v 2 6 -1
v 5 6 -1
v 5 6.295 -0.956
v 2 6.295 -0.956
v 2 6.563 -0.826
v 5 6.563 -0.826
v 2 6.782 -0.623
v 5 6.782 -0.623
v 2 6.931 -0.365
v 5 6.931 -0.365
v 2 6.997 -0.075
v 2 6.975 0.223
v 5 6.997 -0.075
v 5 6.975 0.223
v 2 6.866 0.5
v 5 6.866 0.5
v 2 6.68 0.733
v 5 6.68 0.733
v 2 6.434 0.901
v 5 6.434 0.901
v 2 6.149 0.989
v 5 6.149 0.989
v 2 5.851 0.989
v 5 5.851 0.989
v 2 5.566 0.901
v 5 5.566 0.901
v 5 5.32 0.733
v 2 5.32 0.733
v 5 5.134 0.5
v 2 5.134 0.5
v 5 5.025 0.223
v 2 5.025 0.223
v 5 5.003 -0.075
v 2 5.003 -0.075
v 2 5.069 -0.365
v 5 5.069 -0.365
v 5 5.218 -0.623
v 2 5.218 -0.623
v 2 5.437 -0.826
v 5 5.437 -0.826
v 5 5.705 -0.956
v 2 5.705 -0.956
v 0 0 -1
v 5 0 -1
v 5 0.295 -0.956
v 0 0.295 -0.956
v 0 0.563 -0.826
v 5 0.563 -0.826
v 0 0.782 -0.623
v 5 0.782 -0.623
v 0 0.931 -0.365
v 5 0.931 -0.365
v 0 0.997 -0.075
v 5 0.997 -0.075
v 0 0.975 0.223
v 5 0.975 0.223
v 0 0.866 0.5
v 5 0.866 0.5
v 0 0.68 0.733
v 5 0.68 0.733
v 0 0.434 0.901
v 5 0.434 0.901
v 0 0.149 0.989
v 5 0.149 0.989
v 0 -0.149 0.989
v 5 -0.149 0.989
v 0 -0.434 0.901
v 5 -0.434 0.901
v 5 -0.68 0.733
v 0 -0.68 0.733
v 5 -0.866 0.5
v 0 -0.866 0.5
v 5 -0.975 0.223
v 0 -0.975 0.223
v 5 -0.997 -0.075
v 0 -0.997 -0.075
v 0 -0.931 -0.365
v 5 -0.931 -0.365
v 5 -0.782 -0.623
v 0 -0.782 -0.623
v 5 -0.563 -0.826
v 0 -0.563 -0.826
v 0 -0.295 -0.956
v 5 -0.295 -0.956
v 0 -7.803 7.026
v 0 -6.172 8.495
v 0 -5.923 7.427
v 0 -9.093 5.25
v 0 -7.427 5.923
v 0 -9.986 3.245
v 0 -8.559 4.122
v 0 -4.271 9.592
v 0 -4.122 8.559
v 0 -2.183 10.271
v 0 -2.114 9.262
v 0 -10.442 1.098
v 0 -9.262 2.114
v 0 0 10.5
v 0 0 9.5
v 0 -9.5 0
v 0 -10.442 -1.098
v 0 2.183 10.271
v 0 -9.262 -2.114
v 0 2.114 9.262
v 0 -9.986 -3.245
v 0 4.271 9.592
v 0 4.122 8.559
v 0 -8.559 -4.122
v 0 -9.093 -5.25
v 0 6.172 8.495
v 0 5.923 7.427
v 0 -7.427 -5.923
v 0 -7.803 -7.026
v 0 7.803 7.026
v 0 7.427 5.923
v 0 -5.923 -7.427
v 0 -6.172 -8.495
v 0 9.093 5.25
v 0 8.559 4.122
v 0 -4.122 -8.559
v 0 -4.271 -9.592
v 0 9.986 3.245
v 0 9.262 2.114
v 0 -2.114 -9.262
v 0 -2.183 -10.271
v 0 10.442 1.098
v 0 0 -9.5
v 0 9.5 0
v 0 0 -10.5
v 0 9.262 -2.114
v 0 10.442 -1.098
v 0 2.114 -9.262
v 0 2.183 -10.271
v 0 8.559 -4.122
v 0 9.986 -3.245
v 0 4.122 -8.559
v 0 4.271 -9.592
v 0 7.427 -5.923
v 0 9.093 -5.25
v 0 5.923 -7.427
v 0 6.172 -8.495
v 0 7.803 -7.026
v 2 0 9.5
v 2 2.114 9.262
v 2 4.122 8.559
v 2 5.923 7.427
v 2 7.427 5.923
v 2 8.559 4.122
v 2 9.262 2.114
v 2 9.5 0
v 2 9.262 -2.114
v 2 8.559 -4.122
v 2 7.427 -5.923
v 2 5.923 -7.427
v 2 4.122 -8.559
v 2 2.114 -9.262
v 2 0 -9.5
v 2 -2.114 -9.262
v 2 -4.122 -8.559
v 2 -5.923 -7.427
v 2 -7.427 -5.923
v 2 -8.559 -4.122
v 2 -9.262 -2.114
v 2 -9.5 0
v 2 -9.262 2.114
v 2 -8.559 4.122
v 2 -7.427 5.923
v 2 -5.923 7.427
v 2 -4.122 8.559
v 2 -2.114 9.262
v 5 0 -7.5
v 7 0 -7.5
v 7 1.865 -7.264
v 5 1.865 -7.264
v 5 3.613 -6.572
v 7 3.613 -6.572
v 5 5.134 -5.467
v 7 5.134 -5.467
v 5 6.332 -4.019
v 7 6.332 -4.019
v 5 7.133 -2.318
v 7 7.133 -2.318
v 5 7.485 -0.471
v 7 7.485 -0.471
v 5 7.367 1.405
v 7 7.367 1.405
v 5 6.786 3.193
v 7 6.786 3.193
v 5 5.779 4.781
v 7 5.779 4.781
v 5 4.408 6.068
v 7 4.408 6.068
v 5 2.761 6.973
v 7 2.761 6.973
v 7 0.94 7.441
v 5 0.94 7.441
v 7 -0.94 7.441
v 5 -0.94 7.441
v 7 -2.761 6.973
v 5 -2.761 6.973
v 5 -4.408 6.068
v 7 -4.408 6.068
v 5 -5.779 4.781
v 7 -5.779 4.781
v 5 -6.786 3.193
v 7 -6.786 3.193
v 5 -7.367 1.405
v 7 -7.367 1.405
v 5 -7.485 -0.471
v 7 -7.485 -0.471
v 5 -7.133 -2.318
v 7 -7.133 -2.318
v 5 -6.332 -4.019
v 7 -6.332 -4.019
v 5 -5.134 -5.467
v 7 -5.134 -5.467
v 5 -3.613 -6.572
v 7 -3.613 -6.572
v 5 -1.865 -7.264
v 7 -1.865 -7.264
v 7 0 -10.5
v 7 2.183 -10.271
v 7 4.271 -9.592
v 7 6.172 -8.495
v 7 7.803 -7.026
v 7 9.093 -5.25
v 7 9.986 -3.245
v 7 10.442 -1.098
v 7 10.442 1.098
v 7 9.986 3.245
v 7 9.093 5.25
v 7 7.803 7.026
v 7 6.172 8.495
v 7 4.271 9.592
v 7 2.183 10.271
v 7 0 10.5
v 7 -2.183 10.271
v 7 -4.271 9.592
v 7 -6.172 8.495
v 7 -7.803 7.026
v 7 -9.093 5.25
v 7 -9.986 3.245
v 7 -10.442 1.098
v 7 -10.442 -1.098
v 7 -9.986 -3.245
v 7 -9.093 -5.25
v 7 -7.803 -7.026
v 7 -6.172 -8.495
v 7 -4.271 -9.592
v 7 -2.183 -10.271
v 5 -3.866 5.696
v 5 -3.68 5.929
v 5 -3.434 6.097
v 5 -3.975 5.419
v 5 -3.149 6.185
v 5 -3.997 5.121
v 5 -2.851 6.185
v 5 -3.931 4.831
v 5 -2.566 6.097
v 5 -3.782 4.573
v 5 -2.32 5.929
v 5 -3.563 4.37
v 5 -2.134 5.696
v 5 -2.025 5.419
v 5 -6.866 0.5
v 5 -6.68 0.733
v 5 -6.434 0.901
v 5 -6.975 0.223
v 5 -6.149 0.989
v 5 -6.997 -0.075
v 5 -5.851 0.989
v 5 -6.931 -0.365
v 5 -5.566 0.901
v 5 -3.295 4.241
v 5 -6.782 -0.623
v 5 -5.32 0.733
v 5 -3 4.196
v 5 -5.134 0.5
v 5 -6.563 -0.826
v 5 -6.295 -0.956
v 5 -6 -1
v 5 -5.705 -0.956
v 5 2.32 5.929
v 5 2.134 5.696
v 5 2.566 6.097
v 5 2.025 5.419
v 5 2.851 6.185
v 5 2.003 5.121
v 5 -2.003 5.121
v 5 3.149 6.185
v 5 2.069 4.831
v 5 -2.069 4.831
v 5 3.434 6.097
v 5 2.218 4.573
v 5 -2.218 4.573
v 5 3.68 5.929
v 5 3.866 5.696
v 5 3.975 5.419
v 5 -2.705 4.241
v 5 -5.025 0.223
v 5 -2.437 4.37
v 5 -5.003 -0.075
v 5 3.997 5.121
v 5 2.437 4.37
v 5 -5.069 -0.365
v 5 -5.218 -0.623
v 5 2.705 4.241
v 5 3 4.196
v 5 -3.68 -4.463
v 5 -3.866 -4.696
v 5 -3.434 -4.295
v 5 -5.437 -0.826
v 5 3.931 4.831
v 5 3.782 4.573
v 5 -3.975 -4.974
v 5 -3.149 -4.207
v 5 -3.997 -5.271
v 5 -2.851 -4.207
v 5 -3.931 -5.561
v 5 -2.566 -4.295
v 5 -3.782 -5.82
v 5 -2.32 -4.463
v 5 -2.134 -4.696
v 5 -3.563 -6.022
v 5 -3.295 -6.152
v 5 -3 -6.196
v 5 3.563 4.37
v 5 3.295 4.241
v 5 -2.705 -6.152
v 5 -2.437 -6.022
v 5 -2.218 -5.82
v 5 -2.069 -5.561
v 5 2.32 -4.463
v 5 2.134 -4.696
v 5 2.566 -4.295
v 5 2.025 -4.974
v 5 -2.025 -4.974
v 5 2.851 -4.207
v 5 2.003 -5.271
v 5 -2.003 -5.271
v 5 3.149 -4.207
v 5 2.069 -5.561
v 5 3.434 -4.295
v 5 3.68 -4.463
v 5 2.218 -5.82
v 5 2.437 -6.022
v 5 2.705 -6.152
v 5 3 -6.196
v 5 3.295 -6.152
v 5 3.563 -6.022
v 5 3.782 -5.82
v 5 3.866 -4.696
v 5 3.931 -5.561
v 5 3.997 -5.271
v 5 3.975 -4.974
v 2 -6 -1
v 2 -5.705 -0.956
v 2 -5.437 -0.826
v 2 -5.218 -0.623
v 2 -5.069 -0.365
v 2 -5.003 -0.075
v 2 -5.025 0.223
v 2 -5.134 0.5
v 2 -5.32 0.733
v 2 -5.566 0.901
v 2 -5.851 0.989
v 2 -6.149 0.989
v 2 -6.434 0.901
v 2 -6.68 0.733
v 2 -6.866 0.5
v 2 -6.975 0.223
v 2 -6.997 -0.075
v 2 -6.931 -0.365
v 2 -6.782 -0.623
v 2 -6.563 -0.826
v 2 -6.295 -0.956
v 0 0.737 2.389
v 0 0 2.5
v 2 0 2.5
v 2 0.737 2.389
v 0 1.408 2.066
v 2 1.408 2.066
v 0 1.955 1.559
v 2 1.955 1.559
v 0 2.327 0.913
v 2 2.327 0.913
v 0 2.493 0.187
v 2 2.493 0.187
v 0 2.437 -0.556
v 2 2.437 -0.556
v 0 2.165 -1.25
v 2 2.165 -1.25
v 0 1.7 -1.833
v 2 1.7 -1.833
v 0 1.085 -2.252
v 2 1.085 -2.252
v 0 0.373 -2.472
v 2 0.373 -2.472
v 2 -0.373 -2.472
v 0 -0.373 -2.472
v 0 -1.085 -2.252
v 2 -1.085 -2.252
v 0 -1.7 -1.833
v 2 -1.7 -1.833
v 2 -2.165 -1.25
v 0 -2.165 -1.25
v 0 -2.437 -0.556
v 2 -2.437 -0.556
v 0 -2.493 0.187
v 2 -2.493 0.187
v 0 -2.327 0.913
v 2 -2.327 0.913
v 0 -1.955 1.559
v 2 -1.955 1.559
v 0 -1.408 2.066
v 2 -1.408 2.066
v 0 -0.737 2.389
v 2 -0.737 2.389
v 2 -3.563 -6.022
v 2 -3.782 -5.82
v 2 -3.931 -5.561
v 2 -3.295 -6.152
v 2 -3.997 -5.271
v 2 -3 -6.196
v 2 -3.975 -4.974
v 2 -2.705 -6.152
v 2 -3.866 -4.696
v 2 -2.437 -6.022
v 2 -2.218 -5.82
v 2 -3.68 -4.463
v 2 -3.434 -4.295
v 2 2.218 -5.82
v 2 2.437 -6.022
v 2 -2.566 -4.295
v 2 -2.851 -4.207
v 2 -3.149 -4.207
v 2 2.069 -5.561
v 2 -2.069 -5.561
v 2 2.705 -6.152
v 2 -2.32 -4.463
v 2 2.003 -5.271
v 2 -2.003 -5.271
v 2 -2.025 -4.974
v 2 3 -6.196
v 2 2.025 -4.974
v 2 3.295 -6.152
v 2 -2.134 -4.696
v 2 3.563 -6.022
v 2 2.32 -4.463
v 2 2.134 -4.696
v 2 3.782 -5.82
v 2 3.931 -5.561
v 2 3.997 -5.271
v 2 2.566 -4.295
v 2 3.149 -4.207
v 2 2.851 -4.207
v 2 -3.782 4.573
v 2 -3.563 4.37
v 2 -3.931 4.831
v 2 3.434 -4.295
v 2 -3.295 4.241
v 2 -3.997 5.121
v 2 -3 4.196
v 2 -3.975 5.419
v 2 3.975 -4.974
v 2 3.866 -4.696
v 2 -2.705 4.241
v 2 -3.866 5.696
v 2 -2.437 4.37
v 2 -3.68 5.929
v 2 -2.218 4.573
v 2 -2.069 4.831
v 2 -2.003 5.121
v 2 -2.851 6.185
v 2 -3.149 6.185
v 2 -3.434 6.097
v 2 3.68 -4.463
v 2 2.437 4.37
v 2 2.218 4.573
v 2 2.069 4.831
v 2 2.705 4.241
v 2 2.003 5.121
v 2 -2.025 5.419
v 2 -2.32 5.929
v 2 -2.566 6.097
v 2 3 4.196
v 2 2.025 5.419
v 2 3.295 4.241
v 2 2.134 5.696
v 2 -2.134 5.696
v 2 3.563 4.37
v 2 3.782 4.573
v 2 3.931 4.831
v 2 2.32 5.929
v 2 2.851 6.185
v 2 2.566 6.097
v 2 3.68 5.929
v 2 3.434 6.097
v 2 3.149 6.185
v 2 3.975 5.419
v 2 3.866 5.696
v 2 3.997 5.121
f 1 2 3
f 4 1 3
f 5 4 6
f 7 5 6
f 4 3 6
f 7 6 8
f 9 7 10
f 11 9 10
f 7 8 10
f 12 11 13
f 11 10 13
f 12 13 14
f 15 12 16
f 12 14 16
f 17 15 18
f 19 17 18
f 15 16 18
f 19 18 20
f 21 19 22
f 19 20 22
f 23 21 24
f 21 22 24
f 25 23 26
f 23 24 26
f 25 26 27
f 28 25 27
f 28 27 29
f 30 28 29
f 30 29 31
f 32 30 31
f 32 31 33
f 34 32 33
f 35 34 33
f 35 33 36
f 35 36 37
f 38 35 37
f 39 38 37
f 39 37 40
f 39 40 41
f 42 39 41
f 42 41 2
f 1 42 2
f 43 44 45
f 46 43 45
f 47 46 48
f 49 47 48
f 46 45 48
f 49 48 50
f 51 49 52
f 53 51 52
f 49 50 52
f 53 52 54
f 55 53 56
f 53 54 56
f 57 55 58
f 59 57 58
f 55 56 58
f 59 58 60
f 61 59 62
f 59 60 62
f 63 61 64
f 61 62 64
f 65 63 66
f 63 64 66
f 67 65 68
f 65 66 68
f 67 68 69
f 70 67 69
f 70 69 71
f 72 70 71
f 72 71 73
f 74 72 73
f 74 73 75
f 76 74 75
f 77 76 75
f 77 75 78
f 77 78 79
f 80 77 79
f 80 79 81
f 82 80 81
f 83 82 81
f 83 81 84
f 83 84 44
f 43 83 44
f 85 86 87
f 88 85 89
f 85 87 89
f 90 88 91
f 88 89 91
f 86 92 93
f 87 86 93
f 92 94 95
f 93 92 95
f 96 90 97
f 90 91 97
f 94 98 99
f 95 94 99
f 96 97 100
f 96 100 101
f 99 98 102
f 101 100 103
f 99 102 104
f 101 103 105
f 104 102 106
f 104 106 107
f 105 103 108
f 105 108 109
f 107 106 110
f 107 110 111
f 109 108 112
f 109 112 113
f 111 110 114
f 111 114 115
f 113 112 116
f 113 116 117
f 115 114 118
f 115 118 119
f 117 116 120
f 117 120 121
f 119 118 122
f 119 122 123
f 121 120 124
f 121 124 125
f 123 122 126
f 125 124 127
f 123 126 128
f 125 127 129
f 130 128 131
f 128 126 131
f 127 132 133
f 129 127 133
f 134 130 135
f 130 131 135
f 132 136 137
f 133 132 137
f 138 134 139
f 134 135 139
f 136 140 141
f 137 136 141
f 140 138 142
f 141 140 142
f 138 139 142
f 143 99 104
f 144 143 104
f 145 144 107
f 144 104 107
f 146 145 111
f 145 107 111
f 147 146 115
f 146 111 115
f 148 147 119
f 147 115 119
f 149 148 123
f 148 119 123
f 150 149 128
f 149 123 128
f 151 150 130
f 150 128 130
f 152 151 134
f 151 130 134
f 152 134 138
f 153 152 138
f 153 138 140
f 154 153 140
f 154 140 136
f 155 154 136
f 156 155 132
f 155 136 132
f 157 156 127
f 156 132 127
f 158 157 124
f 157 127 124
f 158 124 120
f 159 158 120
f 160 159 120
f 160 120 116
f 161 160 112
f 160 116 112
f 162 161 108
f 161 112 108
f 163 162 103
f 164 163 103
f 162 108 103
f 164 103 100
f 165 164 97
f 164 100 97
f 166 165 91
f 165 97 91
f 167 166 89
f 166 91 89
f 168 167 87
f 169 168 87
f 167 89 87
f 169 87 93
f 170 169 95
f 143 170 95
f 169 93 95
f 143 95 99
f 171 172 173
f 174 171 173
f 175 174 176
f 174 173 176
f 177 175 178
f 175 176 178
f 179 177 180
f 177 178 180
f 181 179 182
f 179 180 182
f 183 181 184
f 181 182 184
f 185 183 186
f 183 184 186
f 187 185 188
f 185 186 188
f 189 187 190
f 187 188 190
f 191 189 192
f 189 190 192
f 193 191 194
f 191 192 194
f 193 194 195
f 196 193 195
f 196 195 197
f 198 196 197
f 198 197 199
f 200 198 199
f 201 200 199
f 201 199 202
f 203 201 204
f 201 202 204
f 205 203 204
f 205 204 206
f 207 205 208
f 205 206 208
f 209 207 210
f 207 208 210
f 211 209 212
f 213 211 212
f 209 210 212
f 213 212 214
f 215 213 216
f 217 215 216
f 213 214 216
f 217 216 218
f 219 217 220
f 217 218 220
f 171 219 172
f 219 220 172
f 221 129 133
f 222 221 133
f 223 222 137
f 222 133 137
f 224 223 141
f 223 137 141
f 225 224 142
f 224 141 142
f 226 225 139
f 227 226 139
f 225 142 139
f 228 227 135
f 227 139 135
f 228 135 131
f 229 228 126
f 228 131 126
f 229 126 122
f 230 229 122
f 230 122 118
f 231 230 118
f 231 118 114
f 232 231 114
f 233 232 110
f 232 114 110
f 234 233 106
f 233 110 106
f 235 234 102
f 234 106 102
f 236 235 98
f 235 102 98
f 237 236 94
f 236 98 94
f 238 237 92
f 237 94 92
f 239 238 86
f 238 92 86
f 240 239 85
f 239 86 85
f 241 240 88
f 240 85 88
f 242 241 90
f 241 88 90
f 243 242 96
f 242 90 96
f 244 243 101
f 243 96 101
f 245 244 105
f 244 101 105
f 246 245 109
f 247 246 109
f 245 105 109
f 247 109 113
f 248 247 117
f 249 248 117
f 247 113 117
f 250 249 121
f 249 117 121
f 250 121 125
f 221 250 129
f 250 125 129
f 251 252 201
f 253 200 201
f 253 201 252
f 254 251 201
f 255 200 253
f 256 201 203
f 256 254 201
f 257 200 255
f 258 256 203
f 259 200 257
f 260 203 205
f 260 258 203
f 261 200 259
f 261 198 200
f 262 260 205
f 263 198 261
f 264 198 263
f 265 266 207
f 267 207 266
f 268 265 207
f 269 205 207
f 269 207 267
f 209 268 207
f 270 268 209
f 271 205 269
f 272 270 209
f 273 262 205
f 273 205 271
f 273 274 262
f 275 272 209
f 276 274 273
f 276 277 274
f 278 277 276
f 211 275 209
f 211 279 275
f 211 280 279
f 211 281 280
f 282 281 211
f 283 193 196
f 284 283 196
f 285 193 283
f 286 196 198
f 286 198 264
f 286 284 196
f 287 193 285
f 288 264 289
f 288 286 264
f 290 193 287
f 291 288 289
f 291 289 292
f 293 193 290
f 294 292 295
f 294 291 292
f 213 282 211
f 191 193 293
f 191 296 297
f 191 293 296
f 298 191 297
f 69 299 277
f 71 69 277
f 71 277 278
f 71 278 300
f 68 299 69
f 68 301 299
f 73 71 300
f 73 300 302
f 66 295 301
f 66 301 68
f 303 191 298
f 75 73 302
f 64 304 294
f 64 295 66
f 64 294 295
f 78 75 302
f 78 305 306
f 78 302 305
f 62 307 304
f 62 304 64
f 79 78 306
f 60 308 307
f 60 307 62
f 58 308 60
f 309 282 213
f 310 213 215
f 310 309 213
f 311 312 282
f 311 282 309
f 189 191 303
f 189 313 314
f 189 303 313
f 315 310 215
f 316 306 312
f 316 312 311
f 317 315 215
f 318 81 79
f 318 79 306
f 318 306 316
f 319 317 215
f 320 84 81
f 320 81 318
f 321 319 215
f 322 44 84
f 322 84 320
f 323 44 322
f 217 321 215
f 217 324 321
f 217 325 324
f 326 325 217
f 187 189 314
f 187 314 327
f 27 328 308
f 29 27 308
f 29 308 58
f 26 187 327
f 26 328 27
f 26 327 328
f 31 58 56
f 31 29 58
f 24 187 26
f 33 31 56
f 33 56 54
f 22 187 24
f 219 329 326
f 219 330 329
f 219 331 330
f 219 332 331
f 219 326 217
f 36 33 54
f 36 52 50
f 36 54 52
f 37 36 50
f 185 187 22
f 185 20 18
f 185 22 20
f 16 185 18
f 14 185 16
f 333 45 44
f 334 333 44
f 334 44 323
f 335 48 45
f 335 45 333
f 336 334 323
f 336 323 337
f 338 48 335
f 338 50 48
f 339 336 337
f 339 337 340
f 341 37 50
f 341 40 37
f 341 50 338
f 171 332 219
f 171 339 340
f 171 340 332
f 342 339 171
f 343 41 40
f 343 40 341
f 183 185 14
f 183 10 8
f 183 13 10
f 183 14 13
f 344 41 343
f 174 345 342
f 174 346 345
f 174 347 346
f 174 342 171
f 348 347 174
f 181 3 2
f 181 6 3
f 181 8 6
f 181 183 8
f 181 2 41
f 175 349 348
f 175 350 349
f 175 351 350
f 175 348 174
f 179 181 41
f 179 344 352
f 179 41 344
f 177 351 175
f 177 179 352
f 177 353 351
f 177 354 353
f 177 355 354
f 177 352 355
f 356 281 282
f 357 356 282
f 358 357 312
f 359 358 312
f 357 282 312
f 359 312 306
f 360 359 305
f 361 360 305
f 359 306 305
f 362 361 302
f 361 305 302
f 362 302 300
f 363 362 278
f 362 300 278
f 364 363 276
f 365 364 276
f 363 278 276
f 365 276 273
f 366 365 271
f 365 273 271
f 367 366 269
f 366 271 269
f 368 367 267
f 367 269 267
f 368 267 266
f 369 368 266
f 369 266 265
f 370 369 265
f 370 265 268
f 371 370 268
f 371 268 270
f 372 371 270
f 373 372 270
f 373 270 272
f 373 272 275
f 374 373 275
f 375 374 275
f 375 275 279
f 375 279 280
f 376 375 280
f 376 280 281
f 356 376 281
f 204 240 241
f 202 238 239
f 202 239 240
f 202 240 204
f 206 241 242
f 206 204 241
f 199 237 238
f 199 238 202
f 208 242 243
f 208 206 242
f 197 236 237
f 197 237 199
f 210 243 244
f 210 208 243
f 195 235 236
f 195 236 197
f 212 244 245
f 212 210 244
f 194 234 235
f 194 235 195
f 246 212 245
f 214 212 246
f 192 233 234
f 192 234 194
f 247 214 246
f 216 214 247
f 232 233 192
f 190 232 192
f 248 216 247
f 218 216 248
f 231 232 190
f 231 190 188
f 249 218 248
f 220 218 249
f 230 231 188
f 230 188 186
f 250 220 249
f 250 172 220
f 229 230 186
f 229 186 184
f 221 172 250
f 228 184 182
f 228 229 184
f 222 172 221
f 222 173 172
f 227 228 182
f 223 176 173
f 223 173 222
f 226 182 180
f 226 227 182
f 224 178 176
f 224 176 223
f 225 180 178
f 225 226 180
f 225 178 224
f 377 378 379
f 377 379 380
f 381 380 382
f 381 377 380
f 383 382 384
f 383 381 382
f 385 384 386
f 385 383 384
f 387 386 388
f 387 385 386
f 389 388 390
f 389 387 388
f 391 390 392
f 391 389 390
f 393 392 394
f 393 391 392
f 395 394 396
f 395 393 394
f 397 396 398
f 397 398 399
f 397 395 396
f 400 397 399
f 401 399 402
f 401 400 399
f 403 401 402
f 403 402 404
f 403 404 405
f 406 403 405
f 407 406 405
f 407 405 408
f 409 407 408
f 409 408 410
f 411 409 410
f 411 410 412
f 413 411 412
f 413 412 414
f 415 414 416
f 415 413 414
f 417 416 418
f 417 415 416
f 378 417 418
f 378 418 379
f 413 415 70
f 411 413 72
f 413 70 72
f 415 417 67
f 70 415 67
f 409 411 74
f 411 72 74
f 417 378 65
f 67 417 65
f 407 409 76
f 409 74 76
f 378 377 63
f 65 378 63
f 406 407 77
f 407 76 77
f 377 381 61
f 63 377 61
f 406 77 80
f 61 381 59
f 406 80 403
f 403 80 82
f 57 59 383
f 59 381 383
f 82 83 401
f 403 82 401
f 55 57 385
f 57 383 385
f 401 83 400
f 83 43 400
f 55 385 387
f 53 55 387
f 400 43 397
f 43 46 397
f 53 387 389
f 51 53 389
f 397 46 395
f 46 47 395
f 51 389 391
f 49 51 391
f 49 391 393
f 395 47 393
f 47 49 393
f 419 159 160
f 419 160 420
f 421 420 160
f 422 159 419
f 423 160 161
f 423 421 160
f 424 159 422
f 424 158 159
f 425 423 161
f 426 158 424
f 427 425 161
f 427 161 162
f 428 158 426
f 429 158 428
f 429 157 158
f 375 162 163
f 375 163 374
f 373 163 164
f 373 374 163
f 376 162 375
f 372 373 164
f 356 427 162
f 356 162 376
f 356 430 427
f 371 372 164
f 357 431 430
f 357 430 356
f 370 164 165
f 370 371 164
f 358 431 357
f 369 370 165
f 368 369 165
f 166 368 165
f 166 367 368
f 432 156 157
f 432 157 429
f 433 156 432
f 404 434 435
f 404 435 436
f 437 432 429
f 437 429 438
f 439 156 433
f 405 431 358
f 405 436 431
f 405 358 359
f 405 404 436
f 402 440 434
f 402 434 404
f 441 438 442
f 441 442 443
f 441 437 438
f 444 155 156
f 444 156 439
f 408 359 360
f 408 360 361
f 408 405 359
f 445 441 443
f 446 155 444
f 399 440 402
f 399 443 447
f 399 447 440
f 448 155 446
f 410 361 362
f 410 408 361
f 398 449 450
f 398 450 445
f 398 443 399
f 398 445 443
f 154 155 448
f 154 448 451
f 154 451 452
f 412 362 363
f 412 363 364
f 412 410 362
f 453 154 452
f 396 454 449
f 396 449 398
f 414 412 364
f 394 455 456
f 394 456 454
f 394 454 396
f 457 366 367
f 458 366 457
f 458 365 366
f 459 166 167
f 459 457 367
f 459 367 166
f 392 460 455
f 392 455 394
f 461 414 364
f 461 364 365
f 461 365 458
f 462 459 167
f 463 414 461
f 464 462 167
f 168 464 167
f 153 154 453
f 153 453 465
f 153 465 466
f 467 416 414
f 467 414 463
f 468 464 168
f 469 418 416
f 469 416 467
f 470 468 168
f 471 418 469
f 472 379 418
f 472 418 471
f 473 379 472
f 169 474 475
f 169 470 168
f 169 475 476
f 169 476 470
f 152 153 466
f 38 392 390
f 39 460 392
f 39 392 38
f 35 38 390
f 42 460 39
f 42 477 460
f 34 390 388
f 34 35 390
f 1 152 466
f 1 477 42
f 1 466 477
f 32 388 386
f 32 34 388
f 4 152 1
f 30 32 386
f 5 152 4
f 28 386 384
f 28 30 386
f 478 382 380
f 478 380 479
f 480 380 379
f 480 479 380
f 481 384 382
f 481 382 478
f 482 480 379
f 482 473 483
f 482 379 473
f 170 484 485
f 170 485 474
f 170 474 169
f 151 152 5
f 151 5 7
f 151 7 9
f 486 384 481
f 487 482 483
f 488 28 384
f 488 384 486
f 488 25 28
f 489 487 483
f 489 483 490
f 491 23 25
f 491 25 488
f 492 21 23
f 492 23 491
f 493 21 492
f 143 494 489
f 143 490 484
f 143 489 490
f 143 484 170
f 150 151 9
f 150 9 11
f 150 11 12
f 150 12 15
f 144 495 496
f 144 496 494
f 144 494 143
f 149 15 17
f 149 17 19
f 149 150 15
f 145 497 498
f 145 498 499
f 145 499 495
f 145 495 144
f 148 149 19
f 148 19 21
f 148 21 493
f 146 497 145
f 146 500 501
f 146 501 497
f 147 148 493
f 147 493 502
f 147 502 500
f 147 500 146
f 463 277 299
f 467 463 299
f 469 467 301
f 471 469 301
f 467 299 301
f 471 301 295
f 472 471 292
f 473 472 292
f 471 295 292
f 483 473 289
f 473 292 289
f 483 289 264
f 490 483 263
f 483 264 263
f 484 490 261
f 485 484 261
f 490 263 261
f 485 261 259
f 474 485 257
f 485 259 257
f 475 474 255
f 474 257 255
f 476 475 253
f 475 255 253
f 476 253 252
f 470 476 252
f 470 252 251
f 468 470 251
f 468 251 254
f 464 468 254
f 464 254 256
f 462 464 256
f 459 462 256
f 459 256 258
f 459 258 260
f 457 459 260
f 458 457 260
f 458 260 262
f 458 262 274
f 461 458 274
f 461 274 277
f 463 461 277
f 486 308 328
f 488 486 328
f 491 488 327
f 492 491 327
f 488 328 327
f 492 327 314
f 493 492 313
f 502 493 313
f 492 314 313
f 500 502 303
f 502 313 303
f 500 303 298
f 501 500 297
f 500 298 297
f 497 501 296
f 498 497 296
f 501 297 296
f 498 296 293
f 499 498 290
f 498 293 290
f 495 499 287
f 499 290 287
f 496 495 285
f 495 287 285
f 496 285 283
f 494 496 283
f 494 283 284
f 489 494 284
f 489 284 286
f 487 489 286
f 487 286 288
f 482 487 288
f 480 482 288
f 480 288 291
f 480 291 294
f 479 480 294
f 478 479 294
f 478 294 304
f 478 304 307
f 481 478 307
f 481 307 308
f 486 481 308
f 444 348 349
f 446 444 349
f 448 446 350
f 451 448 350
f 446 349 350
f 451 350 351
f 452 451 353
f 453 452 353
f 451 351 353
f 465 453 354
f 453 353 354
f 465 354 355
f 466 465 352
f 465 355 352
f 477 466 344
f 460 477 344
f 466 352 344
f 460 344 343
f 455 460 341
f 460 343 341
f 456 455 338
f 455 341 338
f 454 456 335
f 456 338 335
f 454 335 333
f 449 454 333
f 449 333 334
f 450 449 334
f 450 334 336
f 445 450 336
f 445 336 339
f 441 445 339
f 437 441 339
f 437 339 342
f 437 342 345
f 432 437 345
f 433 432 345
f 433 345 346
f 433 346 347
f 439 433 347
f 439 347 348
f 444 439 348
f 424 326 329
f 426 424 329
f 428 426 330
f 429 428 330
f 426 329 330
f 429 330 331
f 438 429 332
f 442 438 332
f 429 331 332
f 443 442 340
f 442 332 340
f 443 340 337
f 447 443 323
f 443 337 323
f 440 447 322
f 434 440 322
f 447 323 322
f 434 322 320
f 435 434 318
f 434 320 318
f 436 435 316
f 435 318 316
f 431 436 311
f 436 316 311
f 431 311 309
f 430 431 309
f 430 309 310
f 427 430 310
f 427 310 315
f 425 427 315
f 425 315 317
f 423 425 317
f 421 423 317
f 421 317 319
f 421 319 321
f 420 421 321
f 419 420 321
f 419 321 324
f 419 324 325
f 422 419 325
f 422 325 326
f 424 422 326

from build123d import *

# Parameters (mm, degrees)
SKETCH1_R           = 10.5
BOSS_EXTRUDE1_DEPTH = 7
SKETCH2_R           = 7.5
CUT_EXTRUDE1_DEPTH  = 2
SKETCH3_R           = 1
CUT_EXTRUDE2_DEPTH  = 6
SKETCH4_R           = 9.5
SKETCH4_R_2         = 2.5
CUT_EXTRUDE3_DEPTH  = 2


with BuildPart() as part:
    # Sketch1 → Boss-Extrude1 (new body)
    with BuildSketch(Plane(origin=(0, 0, 0), x_dir=(0, 0, -1), z_dir=(1, 0, 0))):
        Circle(SKETCH1_R)
    extrude(amount=BOSS_EXTRUDE1_DEPTH)

    # Sketch2 → Cut-Extrude1 (cut)
    with BuildSketch(Plane(origin=(7, 0, 0), x_dir=(0, 0, -1), z_dir=(1, 0, 0))):
        Circle(SKETCH2_R)
    extrude(amount=-CUT_EXTRUDE1_DEPTH, mode=Mode.SUBTRACT)

    # Sketch3 → Cut-Extrude2 (cut, through all)
    with BuildSketch(Plane(origin=(5, 0, 0), x_dir=(0, 0, -1), z_dir=(1, 0, 0))):
        with Locations((0, 6)):
            Circle(SKETCH3_R)
        Circle(SKETCH3_R)
        with Locations((5.196152423, 3)):
            Circle(SKETCH3_R)
        with Locations((5.196152423, -3)):
            Circle(SKETCH3_R)
        with Locations((0, -6)):
            Circle(SKETCH3_R)
        with Locations((-5.196152423, -3)):
            Circle(SKETCH3_R)
        with Locations((-5.196152423, 3)):
            Circle(SKETCH3_R)
    extrude(amount=-CUT_EXTRUDE2_DEPTH, mode=Mode.SUBTRACT)

    # Sketch4 → Cut-Extrude3 (cut)
    with BuildSketch(Plane.ZY):
        Circle(SKETCH4_R)
        Circle(SKETCH4_R_2, mode=Mode.SUBTRACT)
    extrude(amount=-CUT_EXTRUDE3_DEPTH, mode=Mode.SUBTRACT)


solid = part.part
